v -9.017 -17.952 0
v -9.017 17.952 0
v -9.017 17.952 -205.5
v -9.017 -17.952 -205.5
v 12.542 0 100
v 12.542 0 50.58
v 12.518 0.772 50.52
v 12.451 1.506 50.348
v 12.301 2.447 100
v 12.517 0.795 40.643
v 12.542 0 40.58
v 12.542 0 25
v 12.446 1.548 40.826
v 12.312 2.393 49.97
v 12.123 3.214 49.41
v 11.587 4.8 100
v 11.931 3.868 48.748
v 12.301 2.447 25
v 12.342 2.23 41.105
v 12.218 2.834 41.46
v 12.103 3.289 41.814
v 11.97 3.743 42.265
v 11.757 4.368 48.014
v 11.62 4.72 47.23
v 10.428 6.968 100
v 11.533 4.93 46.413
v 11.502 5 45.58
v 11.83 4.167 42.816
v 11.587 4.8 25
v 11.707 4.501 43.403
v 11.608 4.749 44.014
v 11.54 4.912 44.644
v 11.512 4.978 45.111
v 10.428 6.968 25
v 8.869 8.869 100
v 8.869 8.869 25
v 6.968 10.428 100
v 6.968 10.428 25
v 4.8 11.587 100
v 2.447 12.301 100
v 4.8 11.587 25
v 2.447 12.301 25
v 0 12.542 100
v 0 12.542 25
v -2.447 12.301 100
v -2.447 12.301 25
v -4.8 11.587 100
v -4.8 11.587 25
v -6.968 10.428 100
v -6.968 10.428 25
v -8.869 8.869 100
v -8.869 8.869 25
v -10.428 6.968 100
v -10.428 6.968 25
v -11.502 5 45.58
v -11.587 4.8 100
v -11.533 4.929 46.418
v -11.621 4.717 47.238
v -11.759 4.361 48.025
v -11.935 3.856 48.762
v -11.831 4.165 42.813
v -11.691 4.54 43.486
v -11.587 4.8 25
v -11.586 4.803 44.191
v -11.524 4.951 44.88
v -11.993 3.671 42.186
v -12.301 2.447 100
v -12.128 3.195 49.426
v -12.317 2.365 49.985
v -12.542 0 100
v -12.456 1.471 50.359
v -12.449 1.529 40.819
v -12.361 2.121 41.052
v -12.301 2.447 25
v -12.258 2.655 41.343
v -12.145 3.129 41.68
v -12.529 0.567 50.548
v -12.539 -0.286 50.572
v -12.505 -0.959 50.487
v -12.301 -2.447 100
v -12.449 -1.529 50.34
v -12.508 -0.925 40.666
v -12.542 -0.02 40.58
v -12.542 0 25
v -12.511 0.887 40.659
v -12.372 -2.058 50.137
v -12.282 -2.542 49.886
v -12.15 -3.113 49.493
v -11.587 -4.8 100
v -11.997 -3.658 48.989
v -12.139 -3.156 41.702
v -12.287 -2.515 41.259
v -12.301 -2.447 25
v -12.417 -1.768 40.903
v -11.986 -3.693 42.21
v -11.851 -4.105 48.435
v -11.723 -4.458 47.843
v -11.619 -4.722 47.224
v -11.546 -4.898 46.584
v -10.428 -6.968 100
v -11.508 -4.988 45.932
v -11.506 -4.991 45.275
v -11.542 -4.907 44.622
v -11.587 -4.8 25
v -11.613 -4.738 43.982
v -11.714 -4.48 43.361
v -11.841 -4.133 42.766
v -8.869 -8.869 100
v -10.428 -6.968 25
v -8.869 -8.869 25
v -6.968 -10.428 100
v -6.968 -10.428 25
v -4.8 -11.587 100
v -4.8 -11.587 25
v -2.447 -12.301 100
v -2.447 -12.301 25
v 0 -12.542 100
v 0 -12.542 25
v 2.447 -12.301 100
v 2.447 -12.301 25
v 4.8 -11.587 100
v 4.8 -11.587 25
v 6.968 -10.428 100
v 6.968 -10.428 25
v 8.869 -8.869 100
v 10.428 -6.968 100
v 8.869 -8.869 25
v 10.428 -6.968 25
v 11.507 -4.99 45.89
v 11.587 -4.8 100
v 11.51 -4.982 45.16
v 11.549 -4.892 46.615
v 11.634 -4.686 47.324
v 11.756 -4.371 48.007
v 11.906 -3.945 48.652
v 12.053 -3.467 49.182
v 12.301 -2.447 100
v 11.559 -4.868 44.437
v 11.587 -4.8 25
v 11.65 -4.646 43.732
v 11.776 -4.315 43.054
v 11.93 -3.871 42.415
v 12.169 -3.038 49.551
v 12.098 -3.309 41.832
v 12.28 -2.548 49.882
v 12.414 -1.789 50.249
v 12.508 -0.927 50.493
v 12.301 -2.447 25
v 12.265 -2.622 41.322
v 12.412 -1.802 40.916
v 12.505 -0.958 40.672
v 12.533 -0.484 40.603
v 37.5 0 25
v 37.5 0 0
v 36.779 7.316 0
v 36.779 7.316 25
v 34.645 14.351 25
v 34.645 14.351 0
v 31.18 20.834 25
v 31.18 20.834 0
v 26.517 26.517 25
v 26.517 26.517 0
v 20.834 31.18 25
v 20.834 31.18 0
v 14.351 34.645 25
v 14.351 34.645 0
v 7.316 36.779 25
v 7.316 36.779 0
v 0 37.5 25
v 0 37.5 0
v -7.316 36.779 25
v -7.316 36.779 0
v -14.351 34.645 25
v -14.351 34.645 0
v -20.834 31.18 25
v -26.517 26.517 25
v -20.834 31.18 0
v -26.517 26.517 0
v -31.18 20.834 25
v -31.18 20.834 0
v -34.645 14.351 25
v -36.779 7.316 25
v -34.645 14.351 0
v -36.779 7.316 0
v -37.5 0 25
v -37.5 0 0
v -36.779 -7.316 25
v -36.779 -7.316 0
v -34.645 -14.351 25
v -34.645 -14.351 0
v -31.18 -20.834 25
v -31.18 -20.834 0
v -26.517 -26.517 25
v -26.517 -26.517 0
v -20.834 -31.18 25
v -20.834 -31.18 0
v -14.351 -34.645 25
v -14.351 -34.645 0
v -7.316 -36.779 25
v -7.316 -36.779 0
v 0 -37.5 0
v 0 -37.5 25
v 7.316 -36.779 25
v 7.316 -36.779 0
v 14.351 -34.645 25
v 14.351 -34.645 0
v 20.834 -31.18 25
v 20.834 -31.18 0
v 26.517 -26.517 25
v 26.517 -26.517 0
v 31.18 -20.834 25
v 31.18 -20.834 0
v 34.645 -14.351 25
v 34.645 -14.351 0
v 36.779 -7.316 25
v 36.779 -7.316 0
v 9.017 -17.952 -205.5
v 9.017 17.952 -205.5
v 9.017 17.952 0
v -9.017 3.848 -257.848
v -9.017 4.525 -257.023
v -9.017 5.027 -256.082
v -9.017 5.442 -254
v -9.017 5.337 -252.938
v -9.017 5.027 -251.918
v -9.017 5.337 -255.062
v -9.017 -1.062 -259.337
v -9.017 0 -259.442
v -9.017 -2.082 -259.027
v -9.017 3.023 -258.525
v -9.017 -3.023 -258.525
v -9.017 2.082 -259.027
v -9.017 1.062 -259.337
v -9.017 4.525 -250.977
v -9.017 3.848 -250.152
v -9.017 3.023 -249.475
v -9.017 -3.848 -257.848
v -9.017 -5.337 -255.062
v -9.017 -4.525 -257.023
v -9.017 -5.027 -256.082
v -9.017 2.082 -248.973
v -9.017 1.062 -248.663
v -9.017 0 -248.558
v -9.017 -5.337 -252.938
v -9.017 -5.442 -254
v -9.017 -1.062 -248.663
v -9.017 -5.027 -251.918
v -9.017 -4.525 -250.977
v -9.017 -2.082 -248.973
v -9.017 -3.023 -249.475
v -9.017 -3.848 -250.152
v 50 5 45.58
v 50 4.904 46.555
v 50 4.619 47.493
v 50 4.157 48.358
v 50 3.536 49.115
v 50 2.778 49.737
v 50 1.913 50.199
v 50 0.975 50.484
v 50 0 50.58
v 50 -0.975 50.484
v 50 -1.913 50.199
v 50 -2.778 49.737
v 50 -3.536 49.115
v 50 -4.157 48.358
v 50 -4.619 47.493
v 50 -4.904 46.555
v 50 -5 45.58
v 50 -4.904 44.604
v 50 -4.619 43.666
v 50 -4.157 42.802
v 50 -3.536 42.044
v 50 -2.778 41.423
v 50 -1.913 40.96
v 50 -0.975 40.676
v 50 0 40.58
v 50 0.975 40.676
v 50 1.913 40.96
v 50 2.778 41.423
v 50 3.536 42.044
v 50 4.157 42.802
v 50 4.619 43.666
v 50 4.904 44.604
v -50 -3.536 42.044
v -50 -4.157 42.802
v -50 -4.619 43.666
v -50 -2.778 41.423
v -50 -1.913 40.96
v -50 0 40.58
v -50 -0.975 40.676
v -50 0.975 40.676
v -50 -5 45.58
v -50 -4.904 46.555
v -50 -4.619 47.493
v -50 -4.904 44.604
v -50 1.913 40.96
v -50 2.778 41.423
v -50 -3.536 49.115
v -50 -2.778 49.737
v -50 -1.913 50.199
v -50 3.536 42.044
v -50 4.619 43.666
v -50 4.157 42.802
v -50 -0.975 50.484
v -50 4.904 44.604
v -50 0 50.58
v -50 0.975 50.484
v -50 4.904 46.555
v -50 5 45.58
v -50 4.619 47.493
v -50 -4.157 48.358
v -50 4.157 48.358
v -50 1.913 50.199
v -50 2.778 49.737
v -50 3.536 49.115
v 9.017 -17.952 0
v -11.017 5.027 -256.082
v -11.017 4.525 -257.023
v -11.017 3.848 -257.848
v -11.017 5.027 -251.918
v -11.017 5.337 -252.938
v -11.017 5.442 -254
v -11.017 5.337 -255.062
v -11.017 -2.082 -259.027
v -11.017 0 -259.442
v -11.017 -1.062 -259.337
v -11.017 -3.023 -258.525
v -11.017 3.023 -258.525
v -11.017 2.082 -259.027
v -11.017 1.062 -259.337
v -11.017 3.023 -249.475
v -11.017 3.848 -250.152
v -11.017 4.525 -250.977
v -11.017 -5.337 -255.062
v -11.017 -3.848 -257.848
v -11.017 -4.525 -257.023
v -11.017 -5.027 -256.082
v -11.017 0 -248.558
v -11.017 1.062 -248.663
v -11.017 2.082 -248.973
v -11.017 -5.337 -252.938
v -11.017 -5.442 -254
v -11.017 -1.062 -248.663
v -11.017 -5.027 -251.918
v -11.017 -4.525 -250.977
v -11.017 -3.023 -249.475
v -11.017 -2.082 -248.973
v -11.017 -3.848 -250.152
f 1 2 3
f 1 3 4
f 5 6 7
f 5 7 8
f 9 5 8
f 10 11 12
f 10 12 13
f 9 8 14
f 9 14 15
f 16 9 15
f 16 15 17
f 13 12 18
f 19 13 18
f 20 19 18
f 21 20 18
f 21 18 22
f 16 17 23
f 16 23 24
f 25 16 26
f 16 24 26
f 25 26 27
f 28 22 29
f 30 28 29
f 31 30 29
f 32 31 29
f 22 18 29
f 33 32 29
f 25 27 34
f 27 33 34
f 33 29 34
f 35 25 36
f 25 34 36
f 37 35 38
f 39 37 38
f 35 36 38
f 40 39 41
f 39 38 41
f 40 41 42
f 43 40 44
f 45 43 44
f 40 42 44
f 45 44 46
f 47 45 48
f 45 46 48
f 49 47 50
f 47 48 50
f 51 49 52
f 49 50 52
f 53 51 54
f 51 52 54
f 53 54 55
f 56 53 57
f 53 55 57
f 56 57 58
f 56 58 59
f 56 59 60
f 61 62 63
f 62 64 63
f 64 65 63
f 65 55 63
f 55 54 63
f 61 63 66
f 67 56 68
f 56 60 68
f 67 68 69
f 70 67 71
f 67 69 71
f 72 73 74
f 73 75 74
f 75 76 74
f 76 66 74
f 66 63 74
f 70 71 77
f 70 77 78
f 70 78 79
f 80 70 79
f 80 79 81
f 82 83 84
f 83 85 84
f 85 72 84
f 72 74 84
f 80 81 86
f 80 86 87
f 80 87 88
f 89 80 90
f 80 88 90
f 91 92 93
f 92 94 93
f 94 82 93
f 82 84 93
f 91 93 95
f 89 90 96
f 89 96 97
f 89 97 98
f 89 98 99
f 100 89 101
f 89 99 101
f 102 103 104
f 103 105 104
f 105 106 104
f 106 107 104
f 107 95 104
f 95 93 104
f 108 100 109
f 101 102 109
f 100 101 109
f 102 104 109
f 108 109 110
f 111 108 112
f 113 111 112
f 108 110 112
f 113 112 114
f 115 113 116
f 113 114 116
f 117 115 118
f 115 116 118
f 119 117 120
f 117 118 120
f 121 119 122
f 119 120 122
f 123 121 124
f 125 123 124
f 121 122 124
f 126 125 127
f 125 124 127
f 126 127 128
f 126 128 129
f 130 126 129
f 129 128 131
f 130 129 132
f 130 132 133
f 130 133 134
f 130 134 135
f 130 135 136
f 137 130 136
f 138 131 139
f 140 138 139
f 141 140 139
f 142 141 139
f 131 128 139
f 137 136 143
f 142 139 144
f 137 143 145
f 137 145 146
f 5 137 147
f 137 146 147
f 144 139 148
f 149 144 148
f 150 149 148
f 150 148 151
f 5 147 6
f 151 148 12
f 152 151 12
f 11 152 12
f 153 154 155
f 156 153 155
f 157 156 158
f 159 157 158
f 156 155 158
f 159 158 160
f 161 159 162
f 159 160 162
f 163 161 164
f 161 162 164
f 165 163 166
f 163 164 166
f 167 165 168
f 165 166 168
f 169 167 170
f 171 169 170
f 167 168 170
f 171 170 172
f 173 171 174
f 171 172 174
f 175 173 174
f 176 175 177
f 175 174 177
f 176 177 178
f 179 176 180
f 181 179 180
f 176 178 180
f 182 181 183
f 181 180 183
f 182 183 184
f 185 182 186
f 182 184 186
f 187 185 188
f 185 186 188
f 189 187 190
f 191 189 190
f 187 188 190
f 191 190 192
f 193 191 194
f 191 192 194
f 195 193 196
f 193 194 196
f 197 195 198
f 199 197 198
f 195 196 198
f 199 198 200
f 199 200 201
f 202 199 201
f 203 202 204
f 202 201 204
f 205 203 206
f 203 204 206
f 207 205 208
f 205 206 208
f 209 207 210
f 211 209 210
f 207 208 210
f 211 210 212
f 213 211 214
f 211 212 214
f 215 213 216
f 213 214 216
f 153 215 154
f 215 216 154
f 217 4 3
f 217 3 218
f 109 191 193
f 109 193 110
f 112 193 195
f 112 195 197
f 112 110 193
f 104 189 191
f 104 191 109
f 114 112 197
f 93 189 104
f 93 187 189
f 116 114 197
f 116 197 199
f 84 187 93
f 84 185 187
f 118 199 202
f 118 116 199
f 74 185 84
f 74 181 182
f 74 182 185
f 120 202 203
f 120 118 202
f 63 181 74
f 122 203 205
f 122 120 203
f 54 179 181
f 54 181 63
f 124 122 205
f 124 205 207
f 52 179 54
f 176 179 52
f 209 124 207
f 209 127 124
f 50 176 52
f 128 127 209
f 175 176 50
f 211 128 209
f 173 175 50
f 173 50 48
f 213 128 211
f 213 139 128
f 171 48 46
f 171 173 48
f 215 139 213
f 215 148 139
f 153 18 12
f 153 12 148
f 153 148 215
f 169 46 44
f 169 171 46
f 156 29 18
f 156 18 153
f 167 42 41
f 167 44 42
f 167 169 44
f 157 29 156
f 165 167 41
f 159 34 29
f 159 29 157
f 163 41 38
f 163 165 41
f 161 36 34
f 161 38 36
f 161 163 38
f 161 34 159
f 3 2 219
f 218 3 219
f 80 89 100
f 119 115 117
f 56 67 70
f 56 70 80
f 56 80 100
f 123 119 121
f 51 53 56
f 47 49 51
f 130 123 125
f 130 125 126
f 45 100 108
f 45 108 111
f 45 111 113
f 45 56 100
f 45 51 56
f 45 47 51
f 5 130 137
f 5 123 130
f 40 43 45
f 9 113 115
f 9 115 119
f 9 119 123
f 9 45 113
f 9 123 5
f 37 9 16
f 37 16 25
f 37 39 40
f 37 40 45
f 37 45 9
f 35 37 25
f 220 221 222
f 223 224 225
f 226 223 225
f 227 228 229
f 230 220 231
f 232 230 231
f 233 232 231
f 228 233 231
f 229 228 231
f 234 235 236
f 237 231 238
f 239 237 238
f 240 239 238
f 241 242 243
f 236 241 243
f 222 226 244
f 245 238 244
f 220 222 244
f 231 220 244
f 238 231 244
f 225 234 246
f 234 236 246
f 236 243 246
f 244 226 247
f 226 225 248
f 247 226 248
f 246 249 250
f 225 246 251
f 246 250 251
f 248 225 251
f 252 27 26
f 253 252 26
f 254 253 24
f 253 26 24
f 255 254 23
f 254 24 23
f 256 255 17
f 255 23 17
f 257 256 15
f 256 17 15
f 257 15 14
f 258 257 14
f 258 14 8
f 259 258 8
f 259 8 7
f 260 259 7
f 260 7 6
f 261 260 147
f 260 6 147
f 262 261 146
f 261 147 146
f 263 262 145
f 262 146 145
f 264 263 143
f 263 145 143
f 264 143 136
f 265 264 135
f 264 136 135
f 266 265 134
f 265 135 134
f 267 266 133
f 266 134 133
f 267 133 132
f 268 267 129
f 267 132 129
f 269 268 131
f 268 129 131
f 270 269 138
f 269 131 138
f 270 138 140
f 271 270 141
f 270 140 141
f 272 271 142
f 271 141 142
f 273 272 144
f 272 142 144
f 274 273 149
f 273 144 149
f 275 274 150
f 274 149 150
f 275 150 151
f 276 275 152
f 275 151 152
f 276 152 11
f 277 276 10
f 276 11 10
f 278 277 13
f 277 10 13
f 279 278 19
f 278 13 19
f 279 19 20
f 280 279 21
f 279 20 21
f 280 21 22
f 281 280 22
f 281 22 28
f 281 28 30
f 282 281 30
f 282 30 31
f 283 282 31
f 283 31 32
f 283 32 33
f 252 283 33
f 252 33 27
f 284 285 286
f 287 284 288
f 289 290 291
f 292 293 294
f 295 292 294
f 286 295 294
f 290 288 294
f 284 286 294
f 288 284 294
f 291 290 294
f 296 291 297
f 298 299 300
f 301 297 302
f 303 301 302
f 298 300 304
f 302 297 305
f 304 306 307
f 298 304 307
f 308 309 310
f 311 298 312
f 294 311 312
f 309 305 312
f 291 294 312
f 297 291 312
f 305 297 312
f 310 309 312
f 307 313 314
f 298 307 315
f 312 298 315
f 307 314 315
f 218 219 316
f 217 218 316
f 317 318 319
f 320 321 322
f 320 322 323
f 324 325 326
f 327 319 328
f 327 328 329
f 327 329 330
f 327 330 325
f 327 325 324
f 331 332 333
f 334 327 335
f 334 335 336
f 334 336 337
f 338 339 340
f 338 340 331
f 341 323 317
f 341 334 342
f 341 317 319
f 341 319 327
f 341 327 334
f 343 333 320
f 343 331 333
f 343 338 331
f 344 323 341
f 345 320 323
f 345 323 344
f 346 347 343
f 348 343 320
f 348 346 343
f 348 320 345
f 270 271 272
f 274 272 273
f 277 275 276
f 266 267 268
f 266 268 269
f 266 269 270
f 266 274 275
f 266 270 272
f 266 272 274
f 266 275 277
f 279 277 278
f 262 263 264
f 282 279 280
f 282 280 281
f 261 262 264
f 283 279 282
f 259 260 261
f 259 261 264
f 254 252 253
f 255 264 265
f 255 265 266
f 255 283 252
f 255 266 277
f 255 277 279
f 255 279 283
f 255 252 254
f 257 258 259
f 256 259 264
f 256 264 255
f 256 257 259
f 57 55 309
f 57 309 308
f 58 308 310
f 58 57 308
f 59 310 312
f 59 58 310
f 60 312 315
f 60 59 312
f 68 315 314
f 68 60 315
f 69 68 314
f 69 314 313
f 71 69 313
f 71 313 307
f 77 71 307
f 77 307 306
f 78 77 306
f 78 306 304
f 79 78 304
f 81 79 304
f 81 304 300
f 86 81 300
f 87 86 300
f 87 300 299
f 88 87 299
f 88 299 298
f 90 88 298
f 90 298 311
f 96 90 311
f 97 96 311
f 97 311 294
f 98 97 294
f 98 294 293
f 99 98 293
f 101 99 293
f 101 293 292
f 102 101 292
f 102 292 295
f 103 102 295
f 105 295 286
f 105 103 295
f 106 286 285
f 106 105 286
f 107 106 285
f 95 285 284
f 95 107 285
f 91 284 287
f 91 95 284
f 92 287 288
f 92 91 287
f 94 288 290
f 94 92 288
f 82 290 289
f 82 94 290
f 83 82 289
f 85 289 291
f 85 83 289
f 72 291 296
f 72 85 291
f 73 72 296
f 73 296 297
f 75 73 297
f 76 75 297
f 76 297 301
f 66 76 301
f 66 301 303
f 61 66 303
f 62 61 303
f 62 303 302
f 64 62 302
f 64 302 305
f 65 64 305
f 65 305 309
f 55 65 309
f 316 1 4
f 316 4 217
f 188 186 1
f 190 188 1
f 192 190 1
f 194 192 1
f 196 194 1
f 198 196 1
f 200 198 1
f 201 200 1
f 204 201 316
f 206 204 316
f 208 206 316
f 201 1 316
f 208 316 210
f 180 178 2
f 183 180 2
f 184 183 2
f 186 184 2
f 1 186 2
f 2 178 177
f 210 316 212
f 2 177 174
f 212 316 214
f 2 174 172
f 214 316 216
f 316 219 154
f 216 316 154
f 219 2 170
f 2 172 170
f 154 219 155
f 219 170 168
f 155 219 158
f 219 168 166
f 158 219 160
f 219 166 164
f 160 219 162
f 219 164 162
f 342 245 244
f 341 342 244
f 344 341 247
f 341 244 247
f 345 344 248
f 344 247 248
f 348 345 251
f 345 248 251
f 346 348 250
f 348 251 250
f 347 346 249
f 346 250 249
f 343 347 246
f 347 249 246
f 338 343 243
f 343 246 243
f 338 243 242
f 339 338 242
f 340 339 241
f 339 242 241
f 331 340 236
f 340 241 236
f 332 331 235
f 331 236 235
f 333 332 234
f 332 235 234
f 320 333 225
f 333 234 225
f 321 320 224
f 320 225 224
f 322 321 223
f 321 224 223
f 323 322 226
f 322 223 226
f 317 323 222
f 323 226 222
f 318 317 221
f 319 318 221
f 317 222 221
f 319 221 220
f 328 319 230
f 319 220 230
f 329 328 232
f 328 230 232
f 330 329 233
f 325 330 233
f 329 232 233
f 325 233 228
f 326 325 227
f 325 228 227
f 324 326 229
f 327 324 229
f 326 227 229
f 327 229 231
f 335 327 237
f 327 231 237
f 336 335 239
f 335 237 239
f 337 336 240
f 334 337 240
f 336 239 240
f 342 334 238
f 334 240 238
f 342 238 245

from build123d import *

# Parameters (mm, degrees)
F0_R      = 37.5
F1_DEPTH  = 25
F2_W      = 18.03344
F2_H      = 35.90303
F3_DEPTH  = 205.5
F4_R      = 5.441596
F5_DEPTH  = 2
F6_R      = 12.542088
F7_DEPTH  = 75
F8_R      = 5
F9_DEPTH  = 50
F10_DEPTH = 50


with BuildPart() as f1:
    # F0 (on Top) → F1 (new body)
    with BuildSketch(Plane.XY):
        Circle(F0_R)
    extrude(amount=F1_DEPTH)

    # F2 (on face) → F3 (join)
    with BuildSketch(Plane(origin=(0, 0, 0), x_dir=(1, 0, 0), z_dir=(0, 0, -1))):
        Rectangle(F2_W, F2_H)
    extrude(amount=F3_DEPTH)

    # F6 (on face) → F7 (join)
    with BuildSketch(Plane.XY.offset(25)):
        Circle(F6_R)
    extrude(amount=F7_DEPTH)

    # F8 (on Right) → F9 (join)
    with BuildSketch(Plane.YZ):
        with Locations((0, 45.579873)):
            Circle(F8_R)
    extrude(amount=F9_DEPTH)

    # F8 (on Right) → F10 (join)
    with BuildSketch(Plane.YZ):
        with Locations((0, 45.579873)):
            Circle(F8_R)
    extrude(amount=-F10_DEPTH)


with BuildPart() as f5:
    # F4 (on face) → F5 (new body)
    with BuildSketch(Plane(origin=(-9.01672, 0, 0), x_dir=(0, -1, 0), z_dir=(-1, 0, 0))):
        with Locations((0, -254)):
            Circle(F4_R)
    extrude(amount=F5_DEPTH)


solid = Compound([f1.part, f5.part])
